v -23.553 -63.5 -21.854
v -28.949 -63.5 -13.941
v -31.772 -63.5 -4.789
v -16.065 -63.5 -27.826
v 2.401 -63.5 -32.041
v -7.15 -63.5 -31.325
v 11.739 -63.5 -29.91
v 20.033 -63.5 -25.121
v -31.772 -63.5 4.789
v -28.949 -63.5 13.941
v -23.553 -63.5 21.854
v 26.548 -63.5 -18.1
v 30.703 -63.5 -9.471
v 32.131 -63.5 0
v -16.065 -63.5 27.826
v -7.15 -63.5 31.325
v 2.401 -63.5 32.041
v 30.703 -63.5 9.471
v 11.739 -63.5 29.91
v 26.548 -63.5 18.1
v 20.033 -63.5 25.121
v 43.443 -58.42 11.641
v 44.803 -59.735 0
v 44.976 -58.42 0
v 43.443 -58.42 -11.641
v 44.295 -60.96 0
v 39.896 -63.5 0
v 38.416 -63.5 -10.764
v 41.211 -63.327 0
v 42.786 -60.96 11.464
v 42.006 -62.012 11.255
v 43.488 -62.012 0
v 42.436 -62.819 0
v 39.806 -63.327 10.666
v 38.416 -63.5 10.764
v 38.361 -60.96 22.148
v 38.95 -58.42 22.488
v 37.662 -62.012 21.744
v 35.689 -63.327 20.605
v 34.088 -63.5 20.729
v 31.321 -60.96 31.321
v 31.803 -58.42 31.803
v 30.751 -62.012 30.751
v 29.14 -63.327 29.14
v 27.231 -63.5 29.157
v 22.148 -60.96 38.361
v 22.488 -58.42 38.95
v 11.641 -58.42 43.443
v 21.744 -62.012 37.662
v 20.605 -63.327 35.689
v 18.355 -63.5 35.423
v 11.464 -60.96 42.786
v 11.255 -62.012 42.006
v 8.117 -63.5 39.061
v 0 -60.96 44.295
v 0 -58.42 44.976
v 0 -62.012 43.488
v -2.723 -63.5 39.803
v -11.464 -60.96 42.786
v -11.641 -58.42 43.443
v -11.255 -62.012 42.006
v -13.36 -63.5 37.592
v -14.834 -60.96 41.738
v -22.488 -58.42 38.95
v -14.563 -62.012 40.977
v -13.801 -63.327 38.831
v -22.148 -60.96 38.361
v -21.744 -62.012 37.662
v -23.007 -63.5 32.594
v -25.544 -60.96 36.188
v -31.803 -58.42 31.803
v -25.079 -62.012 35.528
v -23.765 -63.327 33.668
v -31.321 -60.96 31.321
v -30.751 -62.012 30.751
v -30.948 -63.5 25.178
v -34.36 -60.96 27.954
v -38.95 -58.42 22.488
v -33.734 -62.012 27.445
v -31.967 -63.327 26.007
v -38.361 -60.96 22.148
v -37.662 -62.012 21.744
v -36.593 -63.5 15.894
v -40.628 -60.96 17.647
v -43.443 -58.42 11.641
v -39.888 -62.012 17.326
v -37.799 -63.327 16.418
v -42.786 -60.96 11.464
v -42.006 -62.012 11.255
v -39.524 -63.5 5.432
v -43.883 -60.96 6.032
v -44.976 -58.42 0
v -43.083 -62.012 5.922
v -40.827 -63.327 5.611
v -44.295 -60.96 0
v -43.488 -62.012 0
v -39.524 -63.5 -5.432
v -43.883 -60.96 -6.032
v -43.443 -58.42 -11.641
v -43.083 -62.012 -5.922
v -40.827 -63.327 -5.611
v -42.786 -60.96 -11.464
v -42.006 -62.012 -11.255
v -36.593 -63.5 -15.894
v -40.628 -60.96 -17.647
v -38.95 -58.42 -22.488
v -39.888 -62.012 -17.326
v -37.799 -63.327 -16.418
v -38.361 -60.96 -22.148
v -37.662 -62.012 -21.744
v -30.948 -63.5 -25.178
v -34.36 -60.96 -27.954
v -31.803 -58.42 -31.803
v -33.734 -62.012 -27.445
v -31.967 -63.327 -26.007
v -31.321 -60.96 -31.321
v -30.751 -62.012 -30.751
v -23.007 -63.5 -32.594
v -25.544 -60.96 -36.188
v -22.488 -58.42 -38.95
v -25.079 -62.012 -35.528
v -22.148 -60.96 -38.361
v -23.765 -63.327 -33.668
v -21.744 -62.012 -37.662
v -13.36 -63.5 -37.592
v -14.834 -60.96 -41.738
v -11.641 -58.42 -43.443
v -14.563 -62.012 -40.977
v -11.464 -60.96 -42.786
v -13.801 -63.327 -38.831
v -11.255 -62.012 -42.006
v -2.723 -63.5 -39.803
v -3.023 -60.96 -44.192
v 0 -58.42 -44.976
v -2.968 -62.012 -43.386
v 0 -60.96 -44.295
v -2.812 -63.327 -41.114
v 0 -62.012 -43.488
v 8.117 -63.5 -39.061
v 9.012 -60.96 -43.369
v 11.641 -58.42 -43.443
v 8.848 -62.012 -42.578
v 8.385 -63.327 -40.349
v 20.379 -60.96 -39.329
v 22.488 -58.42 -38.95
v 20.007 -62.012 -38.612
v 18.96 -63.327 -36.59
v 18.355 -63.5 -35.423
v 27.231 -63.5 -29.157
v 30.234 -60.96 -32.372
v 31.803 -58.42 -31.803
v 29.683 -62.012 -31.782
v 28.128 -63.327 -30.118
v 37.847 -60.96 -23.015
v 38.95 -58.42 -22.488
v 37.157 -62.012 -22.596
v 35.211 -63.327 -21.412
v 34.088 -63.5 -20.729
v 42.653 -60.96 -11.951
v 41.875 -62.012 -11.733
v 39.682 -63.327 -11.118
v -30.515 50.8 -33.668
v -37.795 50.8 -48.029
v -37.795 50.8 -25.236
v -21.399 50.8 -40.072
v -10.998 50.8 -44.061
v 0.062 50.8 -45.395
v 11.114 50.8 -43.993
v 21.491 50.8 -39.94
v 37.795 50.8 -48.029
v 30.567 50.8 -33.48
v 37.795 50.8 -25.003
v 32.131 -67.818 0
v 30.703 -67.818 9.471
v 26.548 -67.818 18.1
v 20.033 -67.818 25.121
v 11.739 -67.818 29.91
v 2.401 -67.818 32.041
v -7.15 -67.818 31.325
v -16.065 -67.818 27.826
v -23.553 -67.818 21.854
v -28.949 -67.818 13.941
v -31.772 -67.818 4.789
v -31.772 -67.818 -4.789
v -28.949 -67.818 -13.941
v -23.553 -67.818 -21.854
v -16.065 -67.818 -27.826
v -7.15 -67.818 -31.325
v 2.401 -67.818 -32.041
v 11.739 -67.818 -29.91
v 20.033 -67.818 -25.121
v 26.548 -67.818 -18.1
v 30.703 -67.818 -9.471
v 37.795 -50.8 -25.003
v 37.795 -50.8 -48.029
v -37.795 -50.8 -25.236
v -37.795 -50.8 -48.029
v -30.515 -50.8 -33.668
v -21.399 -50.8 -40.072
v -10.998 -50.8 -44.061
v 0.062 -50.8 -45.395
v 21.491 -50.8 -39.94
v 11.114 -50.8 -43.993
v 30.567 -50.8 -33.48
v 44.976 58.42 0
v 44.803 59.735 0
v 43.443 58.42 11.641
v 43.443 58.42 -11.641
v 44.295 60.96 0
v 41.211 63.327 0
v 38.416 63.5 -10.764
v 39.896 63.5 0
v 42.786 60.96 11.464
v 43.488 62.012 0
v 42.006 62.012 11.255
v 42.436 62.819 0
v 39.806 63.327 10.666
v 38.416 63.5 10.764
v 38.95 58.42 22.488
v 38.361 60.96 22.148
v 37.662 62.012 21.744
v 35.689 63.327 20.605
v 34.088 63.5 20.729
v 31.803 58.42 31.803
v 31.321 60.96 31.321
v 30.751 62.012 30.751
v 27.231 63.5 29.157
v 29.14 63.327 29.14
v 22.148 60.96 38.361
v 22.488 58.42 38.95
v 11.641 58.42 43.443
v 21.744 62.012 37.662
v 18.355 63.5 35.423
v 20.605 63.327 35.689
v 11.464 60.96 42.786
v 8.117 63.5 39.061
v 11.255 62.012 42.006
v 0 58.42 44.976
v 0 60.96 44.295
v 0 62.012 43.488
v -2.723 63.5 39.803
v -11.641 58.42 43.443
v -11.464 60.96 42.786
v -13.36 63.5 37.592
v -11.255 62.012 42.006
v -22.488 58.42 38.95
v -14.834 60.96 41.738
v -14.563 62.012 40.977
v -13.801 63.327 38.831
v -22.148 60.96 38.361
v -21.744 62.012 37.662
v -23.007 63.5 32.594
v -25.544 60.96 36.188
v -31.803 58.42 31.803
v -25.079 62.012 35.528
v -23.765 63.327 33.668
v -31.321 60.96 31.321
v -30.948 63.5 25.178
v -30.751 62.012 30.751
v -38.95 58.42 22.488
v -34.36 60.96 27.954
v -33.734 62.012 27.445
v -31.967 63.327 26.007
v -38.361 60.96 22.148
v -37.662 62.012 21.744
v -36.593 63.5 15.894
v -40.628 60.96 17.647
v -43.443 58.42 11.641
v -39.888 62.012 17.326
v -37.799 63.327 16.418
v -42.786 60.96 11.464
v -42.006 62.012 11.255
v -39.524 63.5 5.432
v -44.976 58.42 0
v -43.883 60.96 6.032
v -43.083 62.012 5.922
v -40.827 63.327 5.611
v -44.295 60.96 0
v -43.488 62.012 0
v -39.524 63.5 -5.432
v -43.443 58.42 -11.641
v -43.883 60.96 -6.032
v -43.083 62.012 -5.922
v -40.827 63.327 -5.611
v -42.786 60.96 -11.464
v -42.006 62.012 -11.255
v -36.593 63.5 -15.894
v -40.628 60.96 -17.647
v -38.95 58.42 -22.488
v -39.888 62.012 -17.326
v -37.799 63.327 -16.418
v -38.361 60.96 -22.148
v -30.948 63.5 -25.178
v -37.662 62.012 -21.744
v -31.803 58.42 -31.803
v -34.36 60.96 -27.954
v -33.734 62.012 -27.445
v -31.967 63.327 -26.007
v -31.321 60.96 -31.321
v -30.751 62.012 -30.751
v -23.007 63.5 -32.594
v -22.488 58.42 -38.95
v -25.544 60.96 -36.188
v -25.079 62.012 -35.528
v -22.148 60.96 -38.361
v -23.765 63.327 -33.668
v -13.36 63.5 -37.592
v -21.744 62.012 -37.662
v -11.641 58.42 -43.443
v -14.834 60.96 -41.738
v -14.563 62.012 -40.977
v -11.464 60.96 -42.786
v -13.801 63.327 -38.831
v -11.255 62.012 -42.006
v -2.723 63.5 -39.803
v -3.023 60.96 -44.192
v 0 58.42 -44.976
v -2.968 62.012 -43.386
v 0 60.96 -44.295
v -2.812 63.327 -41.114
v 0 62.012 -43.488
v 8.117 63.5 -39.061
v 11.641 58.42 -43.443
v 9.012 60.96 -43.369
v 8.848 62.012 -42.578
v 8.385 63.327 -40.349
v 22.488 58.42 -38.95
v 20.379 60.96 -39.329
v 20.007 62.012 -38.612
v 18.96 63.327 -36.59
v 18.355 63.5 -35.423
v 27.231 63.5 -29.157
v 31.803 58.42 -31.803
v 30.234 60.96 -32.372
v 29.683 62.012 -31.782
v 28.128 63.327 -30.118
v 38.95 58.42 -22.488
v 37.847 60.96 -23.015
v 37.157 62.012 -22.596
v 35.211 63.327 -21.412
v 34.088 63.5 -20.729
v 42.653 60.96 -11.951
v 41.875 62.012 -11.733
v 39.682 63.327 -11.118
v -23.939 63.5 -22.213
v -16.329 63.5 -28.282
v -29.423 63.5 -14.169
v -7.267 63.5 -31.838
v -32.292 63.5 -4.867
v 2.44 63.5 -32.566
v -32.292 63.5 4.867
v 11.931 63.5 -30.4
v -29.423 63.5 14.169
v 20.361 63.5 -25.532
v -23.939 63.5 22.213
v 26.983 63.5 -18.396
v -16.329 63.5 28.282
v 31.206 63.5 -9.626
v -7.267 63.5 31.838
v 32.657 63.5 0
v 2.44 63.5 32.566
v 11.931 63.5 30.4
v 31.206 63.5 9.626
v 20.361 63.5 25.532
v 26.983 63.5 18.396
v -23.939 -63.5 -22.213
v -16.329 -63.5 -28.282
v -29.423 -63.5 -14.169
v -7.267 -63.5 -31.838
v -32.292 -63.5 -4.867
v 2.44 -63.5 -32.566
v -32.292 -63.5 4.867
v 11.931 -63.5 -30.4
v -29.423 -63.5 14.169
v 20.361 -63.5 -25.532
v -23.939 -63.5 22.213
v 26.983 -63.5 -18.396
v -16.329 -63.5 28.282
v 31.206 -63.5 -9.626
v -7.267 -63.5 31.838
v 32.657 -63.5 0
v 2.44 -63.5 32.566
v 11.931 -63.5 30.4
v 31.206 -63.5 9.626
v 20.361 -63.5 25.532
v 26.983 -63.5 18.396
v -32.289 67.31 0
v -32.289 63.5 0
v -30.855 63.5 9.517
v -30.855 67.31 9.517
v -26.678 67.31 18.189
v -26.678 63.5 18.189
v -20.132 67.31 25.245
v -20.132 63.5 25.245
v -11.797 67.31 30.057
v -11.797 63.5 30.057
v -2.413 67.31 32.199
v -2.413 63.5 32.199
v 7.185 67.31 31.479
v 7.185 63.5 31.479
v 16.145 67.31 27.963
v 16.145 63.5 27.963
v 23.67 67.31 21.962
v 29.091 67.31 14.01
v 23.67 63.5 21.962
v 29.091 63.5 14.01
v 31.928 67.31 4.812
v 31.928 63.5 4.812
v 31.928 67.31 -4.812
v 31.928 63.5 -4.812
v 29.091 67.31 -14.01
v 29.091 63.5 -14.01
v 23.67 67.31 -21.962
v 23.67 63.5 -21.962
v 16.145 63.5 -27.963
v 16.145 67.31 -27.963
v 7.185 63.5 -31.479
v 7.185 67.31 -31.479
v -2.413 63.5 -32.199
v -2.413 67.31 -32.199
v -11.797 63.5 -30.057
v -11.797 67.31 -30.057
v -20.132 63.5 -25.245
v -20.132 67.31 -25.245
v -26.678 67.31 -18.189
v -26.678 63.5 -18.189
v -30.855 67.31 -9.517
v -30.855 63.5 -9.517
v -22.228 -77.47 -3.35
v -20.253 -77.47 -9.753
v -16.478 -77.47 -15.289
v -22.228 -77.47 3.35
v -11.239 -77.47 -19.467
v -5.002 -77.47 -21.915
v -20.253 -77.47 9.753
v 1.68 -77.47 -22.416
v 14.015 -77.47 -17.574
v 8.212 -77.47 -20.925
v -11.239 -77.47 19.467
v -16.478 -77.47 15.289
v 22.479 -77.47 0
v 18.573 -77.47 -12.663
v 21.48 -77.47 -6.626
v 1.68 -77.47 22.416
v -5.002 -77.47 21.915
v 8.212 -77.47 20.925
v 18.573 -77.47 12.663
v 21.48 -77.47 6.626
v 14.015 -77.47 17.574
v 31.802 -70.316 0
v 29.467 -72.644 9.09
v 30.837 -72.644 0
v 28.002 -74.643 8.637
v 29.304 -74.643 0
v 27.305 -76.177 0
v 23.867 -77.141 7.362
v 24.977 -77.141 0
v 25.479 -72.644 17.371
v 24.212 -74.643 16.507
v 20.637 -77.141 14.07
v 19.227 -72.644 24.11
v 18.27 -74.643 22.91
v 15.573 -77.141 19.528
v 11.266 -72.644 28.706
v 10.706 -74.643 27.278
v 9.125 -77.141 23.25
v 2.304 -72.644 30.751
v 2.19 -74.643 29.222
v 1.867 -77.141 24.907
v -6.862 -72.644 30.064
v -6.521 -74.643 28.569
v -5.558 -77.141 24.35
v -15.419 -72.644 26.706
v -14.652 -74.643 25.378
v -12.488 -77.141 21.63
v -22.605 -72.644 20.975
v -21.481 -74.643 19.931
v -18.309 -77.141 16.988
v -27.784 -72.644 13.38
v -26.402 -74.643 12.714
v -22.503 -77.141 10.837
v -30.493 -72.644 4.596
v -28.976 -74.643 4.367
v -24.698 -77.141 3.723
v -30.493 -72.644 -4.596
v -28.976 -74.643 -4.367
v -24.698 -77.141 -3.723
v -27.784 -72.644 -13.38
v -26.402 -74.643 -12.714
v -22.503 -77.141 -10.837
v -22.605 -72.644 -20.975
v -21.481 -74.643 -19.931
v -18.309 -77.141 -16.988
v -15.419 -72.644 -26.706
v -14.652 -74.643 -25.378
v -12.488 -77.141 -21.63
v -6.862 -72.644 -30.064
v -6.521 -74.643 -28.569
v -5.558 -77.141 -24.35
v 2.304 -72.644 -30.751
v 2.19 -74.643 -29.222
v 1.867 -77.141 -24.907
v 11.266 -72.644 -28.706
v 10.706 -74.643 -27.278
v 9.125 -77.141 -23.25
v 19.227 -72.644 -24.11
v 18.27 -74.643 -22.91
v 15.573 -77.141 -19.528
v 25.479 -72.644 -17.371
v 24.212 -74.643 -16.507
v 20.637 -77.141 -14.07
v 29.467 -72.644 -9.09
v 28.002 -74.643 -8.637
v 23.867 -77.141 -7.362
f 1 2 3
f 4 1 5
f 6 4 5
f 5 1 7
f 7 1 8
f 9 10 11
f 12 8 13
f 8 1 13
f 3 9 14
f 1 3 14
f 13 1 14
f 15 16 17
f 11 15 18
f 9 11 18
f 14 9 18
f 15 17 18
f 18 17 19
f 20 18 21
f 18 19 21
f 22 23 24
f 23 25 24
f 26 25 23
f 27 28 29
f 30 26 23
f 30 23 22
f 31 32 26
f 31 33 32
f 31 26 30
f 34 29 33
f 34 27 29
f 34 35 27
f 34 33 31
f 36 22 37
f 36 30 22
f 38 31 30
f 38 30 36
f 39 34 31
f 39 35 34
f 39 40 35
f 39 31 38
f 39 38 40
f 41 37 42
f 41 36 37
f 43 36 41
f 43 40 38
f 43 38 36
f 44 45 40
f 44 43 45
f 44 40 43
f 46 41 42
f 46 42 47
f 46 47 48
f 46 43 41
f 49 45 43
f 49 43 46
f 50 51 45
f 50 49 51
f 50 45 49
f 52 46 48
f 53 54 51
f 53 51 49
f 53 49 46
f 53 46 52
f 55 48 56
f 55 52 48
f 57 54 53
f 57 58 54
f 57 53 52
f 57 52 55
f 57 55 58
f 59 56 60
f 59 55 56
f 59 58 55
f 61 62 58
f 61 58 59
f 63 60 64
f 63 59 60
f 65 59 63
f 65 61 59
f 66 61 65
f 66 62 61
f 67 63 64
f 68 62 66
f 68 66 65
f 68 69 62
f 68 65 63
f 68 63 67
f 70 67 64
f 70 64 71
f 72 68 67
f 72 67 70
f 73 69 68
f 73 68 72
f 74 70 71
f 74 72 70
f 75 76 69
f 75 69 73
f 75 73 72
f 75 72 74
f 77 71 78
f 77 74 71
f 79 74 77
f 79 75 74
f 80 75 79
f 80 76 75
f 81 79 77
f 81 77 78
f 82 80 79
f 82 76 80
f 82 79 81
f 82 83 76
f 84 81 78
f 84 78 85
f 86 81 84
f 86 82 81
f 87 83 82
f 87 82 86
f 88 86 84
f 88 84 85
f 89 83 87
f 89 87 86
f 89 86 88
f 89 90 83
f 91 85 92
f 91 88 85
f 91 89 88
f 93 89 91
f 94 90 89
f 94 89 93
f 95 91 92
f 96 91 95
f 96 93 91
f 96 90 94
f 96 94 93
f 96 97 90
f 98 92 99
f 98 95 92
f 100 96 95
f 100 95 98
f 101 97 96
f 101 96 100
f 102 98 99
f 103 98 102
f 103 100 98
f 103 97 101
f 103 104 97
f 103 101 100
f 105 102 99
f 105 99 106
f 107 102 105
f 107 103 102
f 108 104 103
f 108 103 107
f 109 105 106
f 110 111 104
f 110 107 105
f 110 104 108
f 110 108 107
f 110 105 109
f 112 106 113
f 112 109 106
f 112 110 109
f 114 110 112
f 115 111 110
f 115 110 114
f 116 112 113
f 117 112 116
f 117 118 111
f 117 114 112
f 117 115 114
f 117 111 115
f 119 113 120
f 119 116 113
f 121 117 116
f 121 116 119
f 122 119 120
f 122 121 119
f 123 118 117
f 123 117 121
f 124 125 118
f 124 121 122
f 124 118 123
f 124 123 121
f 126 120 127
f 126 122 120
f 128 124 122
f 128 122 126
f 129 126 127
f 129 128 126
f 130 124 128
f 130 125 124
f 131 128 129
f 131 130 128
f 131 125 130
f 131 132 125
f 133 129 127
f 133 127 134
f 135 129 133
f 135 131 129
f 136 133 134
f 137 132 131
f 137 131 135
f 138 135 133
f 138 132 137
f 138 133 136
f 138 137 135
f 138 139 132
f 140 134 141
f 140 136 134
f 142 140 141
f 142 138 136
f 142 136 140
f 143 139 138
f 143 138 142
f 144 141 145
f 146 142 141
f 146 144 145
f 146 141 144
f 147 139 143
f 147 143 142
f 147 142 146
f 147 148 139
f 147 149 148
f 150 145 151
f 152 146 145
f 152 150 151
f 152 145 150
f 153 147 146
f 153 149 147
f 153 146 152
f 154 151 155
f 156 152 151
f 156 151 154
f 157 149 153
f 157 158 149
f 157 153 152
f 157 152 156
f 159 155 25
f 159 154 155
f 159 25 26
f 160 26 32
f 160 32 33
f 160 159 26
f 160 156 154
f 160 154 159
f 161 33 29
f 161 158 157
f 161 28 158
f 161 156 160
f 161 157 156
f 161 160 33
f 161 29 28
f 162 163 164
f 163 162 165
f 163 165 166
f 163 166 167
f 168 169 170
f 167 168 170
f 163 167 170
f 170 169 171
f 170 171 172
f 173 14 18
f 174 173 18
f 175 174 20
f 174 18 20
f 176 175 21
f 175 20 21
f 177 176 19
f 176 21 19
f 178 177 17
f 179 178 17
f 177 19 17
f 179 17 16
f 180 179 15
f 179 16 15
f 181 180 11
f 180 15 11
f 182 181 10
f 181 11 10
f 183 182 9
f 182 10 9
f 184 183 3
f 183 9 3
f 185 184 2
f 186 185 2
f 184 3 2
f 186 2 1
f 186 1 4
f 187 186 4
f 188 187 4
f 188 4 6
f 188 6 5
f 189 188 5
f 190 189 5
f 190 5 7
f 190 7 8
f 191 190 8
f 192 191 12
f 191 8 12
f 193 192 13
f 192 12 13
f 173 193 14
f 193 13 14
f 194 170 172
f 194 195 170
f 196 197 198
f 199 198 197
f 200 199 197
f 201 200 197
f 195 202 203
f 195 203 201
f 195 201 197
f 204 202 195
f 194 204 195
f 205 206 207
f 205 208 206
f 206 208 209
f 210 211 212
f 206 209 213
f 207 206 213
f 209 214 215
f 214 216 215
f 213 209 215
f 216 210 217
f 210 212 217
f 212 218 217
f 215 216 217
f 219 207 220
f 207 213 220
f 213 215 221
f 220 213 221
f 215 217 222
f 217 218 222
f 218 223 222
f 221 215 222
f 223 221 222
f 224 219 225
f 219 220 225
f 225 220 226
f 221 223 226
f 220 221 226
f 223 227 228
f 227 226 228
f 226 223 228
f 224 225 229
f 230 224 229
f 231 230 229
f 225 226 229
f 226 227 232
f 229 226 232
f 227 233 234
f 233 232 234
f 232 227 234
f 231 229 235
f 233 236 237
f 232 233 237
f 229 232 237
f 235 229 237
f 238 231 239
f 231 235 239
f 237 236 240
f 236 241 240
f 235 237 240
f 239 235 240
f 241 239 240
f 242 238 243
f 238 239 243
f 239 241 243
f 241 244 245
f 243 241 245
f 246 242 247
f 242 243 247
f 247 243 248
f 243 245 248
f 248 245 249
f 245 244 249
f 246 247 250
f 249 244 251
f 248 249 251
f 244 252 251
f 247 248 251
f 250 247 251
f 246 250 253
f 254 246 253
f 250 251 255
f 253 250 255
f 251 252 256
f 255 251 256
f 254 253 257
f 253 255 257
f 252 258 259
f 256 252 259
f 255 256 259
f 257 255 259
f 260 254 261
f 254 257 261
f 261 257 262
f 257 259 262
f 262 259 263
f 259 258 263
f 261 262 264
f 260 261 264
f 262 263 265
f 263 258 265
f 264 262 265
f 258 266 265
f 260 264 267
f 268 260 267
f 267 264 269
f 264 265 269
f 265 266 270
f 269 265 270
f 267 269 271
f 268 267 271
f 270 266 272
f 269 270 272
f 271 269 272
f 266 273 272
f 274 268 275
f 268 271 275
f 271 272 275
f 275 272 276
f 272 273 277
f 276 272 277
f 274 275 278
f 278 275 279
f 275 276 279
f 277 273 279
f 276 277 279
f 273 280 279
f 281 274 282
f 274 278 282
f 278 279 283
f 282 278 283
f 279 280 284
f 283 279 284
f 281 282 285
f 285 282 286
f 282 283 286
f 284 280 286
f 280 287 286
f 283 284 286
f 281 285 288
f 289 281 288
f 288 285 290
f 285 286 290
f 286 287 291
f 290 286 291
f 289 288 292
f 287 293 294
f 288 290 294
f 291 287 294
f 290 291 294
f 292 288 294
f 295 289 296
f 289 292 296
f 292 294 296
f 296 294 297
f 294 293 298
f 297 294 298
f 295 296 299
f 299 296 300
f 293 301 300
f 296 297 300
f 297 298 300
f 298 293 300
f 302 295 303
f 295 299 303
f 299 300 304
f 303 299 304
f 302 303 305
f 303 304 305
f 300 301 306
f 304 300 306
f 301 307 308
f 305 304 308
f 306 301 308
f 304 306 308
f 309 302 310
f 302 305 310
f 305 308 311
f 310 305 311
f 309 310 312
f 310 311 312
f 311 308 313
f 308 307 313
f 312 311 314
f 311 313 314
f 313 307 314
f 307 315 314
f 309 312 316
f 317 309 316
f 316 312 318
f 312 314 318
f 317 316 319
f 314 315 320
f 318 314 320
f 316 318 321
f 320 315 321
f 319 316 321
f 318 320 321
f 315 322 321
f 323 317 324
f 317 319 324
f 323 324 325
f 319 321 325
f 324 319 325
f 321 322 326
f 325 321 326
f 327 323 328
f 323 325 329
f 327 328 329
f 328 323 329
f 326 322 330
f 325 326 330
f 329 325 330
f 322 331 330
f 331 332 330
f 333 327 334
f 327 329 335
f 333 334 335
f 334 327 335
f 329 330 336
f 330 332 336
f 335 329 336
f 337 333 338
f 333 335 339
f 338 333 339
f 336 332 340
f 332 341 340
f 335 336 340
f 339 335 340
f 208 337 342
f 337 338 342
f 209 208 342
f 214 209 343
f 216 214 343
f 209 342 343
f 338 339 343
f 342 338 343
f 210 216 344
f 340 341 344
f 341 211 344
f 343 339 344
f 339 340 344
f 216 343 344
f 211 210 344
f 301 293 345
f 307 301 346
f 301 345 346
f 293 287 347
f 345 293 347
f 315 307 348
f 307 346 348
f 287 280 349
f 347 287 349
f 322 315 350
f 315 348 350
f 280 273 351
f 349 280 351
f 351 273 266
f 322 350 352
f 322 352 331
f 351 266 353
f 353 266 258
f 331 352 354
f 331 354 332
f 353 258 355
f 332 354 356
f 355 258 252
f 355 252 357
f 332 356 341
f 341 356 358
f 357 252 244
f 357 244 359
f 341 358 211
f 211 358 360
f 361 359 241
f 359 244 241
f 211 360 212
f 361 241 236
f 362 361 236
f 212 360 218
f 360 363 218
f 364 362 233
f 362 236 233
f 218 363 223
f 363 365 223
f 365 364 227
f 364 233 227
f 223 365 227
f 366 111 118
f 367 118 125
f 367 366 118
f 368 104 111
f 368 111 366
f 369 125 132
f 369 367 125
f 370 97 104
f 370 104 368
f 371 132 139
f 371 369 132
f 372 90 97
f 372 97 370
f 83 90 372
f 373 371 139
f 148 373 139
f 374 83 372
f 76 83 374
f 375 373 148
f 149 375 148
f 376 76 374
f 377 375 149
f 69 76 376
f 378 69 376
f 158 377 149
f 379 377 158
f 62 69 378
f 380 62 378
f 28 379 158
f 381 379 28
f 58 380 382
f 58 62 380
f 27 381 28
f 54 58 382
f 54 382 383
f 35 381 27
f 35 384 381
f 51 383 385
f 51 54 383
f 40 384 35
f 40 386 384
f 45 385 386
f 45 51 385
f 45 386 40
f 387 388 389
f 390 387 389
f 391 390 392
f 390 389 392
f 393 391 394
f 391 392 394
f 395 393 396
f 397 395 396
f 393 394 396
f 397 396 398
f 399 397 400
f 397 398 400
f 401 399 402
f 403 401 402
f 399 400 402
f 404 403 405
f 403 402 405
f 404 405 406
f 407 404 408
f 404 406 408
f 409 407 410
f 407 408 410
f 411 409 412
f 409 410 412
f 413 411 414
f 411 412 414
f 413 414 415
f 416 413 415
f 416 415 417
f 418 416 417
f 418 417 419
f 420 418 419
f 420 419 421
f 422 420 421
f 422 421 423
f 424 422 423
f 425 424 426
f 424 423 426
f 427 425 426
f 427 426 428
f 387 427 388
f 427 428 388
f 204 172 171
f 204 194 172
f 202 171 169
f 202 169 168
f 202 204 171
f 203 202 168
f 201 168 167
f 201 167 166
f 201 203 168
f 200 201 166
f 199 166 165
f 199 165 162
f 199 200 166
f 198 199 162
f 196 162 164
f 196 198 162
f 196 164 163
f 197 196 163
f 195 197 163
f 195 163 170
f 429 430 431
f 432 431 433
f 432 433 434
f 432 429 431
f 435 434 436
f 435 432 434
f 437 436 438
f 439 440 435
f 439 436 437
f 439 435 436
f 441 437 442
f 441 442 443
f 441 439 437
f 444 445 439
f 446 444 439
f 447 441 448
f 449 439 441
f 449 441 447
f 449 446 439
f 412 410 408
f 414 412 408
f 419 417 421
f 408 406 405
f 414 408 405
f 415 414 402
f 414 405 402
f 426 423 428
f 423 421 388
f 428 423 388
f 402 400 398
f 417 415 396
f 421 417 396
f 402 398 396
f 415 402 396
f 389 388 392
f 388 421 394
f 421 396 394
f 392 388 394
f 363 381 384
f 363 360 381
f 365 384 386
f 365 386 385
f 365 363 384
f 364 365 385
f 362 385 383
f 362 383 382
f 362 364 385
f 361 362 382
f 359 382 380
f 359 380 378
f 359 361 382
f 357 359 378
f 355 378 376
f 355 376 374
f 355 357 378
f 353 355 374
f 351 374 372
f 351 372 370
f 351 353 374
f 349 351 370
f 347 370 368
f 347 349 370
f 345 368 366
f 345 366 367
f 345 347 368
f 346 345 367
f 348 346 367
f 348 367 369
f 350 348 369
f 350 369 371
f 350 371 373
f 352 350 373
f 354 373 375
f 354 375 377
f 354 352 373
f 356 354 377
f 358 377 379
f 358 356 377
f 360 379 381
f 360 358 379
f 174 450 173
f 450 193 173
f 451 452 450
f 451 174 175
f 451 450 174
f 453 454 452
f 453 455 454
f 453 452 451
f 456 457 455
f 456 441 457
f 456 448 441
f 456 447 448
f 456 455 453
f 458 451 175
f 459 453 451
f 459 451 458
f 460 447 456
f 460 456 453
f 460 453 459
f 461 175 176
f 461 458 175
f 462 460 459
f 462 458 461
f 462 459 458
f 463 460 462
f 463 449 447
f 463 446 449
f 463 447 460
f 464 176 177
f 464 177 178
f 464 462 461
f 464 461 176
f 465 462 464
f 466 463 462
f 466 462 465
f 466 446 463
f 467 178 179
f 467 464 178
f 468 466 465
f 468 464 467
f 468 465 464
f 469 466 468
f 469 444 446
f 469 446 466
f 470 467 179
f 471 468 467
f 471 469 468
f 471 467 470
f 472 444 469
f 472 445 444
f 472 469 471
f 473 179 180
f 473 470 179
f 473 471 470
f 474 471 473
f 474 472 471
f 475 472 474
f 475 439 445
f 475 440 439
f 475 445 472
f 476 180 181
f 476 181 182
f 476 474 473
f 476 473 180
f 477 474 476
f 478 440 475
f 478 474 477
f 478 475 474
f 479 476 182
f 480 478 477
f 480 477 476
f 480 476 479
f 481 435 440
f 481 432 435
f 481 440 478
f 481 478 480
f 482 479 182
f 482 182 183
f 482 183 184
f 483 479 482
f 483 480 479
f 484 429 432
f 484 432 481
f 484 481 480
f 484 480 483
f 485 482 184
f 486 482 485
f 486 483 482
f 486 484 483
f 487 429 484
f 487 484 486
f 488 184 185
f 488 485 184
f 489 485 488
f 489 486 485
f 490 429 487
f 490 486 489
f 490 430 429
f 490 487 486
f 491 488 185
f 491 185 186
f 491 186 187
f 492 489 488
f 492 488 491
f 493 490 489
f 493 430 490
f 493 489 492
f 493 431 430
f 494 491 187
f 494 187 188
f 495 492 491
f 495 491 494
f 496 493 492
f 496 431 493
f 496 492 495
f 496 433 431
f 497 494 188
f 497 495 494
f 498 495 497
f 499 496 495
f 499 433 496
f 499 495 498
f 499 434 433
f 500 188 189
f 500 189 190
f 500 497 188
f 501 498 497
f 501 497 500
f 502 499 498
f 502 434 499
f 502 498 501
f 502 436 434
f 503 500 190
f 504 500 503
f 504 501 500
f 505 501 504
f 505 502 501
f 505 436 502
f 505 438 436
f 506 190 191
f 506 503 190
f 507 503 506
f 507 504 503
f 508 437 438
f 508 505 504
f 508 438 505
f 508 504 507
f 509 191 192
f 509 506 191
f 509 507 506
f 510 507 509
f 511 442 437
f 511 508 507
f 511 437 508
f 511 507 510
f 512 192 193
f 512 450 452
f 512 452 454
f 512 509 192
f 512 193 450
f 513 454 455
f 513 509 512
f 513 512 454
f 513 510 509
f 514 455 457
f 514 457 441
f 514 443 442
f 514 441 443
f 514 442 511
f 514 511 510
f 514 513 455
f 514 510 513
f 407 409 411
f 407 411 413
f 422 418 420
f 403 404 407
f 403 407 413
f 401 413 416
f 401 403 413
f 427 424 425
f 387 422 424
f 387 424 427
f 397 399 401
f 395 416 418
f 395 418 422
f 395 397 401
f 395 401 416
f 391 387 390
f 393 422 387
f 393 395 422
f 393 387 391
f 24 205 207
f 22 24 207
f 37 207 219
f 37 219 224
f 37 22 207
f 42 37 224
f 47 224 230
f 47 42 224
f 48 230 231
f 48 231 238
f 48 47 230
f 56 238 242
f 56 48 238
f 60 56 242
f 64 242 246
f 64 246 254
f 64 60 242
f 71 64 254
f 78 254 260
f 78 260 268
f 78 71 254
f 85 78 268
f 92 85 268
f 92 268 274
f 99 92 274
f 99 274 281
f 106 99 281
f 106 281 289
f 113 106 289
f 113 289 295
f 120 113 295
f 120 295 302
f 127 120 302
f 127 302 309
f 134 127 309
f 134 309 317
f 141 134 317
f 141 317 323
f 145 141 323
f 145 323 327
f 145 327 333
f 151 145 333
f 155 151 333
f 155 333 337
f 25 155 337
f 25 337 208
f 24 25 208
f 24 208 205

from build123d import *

# Parameters (mm, degrees)
F0_R      = 44.975712
F0_R_2    = 32.657182
F1_DEPTH  = 63.5
F2_R      = 32.130585
F3_DEPTH  = 13.97
F4_R      = 9.652
F5_R      = 5.08
F6_R      = 32.28902
F7_DEPTH  = 3.81
F8_R      = 5.08
F10_DEPTH = 50.8


with BuildPart() as f1:
    # F0 (on Front) → F1 (new body, symmetric)
    with BuildSketch(Plane.XZ):
        Circle(F0_R)
        Circle(F0_R_2, mode=Mode.SUBTRACT)
    extrude(amount=F1_DEPTH, both=True)

    # F5
    f5_edges = [f1.edges().sort_by_distance(p)[0] for p in [
        (-44.975712, 63.5, 0),
    ]]
    fillet(f5_edges, radius=F5_R)

    # F8
    f8_edges = [f1.edges().sort_by_distance(p)[0] for p in [
        (-44.975712, -63.5, 0),
    ]]
    fillet(f8_edges, radius=F8_R)


with BuildPart() as f3:
    # F2 (on face) → F3 (new body)
    with BuildSketch(Plane.XZ.offset(63.5)):
        Circle(F2_R)
    extrude(amount=F3_DEPTH)

    # F4
    f4_edges = [f3.edges().sort_by_distance(p)[0] for p in [
        (-32.130585, -77.47, 0),
    ]]
    fillet(f4_edges, radius=F4_R)


with BuildPart() as f7:
    # F6 (on face) → F7 (new body)
    with BuildSketch(Plane(origin=(0, 63.5, 0), x_dir=(-1, 0, 0), z_dir=(0, 1, 0))):
        Circle(F6_R)
    extrude(amount=F7_DEPTH)


with BuildPart() as f10:
    # F9 (on Front) → F10 (new body, symmetric)
    with BuildSketch(Plane.XZ):
        with BuildLine():
            ThreePointArc((37.795421, -25.003126), (0.062386, -45.394918), (-37.795421, -25.235713))
            Line((-37.795421, -25.235713), (-37.795421, -48.029263))
            Line((-37.795421, -48.029263), (37.795421, -48.029263))
            Line((37.795421, -48.029263), (37.795421, -25.003126))
        make_face()
    extrude(amount=F10_DEPTH, both=True)


solid = Compound([f1.part, f3.part, f7.part, f10.part])
